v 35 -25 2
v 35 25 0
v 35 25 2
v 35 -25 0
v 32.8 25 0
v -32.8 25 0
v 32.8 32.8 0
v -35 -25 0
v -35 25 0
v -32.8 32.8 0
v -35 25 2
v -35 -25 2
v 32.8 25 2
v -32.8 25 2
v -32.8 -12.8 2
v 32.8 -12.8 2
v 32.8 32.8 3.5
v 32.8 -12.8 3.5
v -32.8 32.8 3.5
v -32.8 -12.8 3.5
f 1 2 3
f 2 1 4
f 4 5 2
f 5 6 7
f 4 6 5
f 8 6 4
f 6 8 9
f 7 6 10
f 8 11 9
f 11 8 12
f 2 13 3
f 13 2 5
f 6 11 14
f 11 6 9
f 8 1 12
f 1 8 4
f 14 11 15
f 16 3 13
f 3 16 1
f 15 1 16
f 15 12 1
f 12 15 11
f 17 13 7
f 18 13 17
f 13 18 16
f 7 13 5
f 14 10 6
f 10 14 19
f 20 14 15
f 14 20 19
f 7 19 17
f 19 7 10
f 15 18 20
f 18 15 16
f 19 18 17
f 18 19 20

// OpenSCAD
// Two-part enclosure for small electronics board
// Print orientation: box standing on bed, lid upside down (plate on bed)

$fn = 64;

// ---- Box ----
box_x = 70;      // outer length (X)
box_y = 50;      // outer width (Y)
box_z = 30;      // outer height (Z)
wall = 2;        // wall thickness
floor = 2;       // floor thickness

// ---- Lid ----
lip_w = 65.6;    // lip outer length (X)
lip_d = 45.6;    // lip outer width (Y)
lip_h = 1.5;     // lip height (wall above plate)
plate_t = 2;     // plate thickness
clearance = 0.2; // gap between lip outer and box inner (each side)

// ---- Layout ----
gap = 10;        // gap between box and lid on bed
lip_overlap = wall + clearance; // lip extends into box opening

module box() {
    difference() {
        translate([-box_x/2, -box_y/2, 0])
            cube([box_x, box_y, box_z]);
        // open top: cut down to floor height
        translate([-box_x/2 - 1, -box_y/2 - 1, floor])
            cube([box_x + 2, box_y + 2, box_z - floor + 1]);
    }
}

module lid() {
    union() {
        // plate
        translate([-lip_w/2, -lip_d/2, 0])
            cube([lip_w, lip_d, plate_t]);
        // lip
        translate([-lip_w/2, -lip_d/2, plate_t])
            cube([lip_w, lip_d, lip_h]);
    }
}

box();
translate([0, gap, 0]) lid();
